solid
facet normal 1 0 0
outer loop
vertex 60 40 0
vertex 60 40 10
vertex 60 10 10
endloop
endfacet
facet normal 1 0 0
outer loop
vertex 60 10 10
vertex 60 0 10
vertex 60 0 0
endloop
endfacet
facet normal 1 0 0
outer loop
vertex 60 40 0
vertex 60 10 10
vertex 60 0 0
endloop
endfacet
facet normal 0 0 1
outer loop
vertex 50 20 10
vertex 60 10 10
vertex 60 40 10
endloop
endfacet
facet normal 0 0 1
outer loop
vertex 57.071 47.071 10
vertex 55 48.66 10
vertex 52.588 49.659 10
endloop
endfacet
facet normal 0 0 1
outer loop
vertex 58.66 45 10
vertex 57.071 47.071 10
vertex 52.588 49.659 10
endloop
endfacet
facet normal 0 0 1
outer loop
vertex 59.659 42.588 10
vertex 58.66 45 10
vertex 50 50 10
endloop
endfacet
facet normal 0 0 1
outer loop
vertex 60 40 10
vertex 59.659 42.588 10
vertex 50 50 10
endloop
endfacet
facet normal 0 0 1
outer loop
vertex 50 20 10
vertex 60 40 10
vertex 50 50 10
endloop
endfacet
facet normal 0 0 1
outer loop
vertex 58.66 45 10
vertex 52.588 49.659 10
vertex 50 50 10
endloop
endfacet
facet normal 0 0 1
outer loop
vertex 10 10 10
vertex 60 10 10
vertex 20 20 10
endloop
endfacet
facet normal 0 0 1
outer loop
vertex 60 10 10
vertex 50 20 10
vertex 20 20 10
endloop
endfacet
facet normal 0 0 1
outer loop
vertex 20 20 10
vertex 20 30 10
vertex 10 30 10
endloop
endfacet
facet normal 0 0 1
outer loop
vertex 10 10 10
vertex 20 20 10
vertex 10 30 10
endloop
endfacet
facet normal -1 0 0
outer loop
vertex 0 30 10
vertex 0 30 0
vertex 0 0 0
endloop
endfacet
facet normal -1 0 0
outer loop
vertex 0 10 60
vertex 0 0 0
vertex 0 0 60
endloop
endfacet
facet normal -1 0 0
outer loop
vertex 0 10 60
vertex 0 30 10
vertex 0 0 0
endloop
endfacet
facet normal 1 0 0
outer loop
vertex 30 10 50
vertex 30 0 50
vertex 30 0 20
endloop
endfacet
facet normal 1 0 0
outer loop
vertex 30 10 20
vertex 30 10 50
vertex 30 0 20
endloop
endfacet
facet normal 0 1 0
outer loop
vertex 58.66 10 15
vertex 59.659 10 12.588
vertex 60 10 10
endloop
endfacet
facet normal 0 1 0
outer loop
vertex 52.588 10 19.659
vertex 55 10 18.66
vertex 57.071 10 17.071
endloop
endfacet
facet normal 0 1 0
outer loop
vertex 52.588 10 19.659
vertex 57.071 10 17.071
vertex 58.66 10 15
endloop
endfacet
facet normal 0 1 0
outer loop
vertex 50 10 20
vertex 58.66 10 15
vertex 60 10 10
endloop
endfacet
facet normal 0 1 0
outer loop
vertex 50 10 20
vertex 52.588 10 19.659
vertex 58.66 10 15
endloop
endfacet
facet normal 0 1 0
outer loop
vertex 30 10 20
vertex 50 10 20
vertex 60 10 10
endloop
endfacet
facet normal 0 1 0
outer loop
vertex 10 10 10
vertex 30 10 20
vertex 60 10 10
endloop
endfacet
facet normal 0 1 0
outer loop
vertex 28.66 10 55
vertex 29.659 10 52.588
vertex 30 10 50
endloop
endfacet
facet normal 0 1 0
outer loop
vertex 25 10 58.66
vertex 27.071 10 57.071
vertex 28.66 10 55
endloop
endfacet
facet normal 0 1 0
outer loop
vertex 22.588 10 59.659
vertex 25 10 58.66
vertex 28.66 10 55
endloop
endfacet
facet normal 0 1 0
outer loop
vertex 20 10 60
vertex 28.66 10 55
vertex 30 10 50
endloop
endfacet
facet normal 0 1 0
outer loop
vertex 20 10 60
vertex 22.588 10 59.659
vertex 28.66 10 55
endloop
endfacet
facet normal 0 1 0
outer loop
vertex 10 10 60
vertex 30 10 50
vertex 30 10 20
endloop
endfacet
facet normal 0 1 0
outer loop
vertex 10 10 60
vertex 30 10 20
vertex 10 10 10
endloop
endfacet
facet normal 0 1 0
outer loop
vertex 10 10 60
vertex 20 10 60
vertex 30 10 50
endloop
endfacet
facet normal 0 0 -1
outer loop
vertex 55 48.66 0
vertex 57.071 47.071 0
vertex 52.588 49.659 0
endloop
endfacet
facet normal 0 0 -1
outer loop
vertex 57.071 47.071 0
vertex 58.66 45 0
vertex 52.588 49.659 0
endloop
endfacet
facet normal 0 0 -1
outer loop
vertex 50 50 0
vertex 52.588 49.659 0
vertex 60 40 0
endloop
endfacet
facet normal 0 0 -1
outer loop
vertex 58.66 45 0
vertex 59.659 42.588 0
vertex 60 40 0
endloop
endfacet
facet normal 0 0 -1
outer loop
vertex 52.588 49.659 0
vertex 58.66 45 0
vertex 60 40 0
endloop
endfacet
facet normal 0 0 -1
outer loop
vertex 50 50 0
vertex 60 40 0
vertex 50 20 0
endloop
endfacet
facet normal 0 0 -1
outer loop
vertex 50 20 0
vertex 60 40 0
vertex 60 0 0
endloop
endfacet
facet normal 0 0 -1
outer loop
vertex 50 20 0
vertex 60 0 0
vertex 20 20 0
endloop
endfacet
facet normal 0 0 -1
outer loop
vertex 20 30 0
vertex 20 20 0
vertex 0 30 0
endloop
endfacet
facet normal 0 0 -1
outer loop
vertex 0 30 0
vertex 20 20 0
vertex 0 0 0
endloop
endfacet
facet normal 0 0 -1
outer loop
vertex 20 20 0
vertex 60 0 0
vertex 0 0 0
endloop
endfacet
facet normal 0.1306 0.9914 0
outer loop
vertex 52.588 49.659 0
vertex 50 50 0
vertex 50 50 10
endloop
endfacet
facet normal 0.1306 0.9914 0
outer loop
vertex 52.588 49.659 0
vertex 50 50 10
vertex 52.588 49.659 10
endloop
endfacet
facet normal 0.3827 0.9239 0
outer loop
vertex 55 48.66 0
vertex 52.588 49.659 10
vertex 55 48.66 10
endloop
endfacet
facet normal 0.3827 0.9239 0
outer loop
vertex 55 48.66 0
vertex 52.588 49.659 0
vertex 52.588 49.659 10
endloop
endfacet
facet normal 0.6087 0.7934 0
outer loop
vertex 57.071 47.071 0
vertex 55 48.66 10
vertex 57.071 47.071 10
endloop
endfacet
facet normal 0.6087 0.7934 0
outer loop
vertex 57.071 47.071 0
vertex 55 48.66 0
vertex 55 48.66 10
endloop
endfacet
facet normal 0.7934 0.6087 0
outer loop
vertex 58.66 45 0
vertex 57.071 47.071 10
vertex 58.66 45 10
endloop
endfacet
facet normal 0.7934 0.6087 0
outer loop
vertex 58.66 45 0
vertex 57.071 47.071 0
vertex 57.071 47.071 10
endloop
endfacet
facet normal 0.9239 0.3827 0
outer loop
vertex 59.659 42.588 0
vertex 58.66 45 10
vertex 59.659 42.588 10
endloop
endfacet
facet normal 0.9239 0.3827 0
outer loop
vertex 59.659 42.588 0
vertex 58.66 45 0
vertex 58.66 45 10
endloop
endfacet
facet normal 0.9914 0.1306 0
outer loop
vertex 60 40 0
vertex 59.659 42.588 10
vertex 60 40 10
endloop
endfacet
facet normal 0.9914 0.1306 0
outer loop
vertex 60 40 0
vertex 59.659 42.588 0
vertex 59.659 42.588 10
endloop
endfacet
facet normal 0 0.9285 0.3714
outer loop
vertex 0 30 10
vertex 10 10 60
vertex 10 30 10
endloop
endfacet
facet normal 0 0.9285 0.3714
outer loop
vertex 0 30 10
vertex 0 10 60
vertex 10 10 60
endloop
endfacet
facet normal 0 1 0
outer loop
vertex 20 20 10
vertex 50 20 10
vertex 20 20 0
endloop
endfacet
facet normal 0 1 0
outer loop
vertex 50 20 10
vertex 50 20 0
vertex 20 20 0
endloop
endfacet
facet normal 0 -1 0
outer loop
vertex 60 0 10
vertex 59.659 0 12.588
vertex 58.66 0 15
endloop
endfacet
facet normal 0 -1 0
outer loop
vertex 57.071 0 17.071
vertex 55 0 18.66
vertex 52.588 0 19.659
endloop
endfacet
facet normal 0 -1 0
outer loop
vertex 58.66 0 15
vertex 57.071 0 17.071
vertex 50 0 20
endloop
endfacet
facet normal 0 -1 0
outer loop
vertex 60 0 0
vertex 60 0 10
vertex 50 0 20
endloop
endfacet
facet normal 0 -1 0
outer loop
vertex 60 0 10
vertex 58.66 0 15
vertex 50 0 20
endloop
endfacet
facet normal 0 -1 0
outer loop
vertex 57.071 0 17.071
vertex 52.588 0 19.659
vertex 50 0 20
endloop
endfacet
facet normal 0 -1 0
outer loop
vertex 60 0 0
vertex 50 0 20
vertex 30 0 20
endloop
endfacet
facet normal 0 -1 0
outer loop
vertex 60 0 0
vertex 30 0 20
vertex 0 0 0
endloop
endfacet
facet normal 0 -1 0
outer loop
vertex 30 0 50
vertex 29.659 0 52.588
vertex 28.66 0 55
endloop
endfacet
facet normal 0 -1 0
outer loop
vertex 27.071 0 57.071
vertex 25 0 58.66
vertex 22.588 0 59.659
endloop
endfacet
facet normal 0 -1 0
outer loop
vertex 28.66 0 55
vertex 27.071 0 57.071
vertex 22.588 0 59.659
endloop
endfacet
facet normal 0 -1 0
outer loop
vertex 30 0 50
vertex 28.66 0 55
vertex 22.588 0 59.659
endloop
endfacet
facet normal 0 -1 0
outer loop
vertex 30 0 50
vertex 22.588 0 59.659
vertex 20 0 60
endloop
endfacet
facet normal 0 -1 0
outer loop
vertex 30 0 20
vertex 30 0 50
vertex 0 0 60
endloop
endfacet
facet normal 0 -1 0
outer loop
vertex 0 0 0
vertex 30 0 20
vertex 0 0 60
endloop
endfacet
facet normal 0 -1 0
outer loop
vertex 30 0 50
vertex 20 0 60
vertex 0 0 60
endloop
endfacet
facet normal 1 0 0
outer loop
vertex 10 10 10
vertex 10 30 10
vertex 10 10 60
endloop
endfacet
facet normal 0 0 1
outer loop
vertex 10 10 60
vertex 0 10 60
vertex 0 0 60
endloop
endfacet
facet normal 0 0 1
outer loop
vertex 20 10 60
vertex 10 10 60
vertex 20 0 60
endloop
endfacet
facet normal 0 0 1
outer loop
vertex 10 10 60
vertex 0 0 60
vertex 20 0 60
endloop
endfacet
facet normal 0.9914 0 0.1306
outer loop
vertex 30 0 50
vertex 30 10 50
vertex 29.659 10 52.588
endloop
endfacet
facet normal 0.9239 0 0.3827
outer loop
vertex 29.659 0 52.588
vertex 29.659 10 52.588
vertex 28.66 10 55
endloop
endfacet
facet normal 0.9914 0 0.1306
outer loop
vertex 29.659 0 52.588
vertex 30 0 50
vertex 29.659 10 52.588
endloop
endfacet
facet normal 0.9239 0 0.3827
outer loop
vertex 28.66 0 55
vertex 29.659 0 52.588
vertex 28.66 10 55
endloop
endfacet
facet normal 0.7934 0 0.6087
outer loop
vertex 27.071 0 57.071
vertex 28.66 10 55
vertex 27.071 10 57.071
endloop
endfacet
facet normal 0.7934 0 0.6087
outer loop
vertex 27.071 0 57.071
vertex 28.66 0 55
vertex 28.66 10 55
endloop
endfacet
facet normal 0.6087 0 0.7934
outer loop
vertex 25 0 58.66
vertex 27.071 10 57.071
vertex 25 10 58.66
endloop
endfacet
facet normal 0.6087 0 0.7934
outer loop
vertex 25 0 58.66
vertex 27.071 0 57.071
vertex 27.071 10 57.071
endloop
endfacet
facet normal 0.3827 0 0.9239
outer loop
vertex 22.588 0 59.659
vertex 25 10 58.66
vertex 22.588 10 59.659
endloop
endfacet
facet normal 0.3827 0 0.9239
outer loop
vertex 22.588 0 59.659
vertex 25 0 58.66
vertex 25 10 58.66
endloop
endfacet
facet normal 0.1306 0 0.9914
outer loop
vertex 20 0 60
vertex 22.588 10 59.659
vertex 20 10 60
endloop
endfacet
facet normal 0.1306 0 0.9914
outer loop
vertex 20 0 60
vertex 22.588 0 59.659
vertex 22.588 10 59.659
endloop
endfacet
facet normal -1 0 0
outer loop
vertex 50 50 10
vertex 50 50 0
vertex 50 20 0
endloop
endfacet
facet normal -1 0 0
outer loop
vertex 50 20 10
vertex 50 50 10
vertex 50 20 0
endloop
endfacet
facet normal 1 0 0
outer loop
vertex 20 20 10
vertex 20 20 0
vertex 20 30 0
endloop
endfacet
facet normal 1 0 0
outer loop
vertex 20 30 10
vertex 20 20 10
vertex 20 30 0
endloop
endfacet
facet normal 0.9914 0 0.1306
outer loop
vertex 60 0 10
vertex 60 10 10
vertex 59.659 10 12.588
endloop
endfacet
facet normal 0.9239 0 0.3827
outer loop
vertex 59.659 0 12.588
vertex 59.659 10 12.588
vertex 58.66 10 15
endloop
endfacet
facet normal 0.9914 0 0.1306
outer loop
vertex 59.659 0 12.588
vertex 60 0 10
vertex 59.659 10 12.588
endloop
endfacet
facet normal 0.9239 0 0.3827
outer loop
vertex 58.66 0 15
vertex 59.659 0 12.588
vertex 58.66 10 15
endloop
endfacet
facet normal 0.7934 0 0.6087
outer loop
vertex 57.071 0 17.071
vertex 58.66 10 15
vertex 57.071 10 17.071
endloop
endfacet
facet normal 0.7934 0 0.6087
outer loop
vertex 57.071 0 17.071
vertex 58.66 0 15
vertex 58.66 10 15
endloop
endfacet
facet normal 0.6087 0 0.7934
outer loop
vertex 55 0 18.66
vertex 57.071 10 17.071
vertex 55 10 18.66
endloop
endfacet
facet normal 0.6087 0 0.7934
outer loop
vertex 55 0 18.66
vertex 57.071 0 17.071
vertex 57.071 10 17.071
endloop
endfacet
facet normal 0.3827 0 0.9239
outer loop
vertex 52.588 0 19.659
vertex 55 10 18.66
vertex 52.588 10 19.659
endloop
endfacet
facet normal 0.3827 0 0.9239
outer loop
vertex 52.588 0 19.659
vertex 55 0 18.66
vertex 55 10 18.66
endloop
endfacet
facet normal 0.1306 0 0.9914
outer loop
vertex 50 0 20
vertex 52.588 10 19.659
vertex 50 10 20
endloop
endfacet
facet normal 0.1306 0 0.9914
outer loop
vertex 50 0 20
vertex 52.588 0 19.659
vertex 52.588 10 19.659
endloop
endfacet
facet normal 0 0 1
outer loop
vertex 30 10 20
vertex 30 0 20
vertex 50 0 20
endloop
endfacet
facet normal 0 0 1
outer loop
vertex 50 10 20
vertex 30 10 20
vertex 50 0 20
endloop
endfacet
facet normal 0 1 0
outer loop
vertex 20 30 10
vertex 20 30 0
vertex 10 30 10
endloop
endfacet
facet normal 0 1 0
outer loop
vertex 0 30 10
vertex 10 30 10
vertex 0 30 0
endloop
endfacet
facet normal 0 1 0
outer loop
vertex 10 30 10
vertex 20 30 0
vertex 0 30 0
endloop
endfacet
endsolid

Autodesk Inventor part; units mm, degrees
ref_plane "YZ Plane" through (0, 0, 0) normal (1, 0, 0) x (0, 1, 0)
ref_plane "XZ Plane" through (0, 0, 0) normal (0, 1, 0) x (-1, 0, 0)
ref_plane "XY Plane" through (0, 0, 0) normal (0, 0, 1) x (1, 0, 0)
sketch "草圖1" plane through (0, 0, 0) normal (0, 1, 0) x (-1, 0, 0)
  line L0 (0, 0) -> (0, 60)
  line L1 (-60, 10) -> (-60, 0)
  line L2 (-60, 0) -> (0, 0)
  line L3 (0, 60) -> (-20, 60)
  arc A0 (-20, 60) -> (-30, 50) centre (-20, 50) ccw
  line L4 (-30, 50) -> (-30, 20)
  line L5 (-30, 20) -> (-50, 20)
  arc A1 (-50, 20) -> (-60, 10) centre (-50, 10) ccw
  dimension "d0" = 60
  dimension "d1" = 10
  dimension "d2" = 20
  dimension "d3" = 60
  dimension "d4" = 30
  dimension "d5" = 20
extrude "擠出1" add sketch "草圖1" along normal blind 10
sketch "草圖2" plane through (60, 0, 0) normal (0, 0, -1) x (-1, 0, 0)
  line L0 (0, 0) -> (0, 10) projected
  line L1 (0, 10) -> (60, 10) projected
  line L2 (60, 10) -> (60, 0) projected
  line L3 (60, 0) -> (0, 0) projected
  line L4 (0, 10) -> (0, 40)
  arc A0 (10, 50) -> (0, 40) centre (10, 40) ccw
  line L5 (10, 50) -> (10, 20)
  line L6 (10, 20) -> (40, 20)
  line L7 (40, 20) -> (40, 30)
  line L8 (40, 30) -> (60, 30)
  line L9 (60, 30) -> (60, 10)
  dimension "d8" = 30
  dimension "d9" = 20
  dimension "d10" = 10
  dimension "d11" = 20
  dimension "d12" = 50
extrude "擠出2" add sketch "草圖2" against normal blind 10 contours L4 A0 L5 L6 L7 L8 L9 L1
sketch "草圖3" plane through (0, 0, 0) normal (-1, 0, 0) x (0, 0, 1)
  line L0 (0, 30) -> (10, 30) projected
  line L1 (10, 30) -> (10, 10) projected
  line L2 (10, 10) -> (60, 10) projected
  line L3 (60, 10) -> (60, 0) projected
  line L4 (60, 0) -> (0, 0) projected
  line L5 (0, 0) -> (0, 30) projected
  line L6 (60, 10) -> (10, 30)
extrude "擠出3" add sketch "草圖3" against normal blind 10 contours L6 L2 L1
properties part number "5" material "鋼、碳鋼"
